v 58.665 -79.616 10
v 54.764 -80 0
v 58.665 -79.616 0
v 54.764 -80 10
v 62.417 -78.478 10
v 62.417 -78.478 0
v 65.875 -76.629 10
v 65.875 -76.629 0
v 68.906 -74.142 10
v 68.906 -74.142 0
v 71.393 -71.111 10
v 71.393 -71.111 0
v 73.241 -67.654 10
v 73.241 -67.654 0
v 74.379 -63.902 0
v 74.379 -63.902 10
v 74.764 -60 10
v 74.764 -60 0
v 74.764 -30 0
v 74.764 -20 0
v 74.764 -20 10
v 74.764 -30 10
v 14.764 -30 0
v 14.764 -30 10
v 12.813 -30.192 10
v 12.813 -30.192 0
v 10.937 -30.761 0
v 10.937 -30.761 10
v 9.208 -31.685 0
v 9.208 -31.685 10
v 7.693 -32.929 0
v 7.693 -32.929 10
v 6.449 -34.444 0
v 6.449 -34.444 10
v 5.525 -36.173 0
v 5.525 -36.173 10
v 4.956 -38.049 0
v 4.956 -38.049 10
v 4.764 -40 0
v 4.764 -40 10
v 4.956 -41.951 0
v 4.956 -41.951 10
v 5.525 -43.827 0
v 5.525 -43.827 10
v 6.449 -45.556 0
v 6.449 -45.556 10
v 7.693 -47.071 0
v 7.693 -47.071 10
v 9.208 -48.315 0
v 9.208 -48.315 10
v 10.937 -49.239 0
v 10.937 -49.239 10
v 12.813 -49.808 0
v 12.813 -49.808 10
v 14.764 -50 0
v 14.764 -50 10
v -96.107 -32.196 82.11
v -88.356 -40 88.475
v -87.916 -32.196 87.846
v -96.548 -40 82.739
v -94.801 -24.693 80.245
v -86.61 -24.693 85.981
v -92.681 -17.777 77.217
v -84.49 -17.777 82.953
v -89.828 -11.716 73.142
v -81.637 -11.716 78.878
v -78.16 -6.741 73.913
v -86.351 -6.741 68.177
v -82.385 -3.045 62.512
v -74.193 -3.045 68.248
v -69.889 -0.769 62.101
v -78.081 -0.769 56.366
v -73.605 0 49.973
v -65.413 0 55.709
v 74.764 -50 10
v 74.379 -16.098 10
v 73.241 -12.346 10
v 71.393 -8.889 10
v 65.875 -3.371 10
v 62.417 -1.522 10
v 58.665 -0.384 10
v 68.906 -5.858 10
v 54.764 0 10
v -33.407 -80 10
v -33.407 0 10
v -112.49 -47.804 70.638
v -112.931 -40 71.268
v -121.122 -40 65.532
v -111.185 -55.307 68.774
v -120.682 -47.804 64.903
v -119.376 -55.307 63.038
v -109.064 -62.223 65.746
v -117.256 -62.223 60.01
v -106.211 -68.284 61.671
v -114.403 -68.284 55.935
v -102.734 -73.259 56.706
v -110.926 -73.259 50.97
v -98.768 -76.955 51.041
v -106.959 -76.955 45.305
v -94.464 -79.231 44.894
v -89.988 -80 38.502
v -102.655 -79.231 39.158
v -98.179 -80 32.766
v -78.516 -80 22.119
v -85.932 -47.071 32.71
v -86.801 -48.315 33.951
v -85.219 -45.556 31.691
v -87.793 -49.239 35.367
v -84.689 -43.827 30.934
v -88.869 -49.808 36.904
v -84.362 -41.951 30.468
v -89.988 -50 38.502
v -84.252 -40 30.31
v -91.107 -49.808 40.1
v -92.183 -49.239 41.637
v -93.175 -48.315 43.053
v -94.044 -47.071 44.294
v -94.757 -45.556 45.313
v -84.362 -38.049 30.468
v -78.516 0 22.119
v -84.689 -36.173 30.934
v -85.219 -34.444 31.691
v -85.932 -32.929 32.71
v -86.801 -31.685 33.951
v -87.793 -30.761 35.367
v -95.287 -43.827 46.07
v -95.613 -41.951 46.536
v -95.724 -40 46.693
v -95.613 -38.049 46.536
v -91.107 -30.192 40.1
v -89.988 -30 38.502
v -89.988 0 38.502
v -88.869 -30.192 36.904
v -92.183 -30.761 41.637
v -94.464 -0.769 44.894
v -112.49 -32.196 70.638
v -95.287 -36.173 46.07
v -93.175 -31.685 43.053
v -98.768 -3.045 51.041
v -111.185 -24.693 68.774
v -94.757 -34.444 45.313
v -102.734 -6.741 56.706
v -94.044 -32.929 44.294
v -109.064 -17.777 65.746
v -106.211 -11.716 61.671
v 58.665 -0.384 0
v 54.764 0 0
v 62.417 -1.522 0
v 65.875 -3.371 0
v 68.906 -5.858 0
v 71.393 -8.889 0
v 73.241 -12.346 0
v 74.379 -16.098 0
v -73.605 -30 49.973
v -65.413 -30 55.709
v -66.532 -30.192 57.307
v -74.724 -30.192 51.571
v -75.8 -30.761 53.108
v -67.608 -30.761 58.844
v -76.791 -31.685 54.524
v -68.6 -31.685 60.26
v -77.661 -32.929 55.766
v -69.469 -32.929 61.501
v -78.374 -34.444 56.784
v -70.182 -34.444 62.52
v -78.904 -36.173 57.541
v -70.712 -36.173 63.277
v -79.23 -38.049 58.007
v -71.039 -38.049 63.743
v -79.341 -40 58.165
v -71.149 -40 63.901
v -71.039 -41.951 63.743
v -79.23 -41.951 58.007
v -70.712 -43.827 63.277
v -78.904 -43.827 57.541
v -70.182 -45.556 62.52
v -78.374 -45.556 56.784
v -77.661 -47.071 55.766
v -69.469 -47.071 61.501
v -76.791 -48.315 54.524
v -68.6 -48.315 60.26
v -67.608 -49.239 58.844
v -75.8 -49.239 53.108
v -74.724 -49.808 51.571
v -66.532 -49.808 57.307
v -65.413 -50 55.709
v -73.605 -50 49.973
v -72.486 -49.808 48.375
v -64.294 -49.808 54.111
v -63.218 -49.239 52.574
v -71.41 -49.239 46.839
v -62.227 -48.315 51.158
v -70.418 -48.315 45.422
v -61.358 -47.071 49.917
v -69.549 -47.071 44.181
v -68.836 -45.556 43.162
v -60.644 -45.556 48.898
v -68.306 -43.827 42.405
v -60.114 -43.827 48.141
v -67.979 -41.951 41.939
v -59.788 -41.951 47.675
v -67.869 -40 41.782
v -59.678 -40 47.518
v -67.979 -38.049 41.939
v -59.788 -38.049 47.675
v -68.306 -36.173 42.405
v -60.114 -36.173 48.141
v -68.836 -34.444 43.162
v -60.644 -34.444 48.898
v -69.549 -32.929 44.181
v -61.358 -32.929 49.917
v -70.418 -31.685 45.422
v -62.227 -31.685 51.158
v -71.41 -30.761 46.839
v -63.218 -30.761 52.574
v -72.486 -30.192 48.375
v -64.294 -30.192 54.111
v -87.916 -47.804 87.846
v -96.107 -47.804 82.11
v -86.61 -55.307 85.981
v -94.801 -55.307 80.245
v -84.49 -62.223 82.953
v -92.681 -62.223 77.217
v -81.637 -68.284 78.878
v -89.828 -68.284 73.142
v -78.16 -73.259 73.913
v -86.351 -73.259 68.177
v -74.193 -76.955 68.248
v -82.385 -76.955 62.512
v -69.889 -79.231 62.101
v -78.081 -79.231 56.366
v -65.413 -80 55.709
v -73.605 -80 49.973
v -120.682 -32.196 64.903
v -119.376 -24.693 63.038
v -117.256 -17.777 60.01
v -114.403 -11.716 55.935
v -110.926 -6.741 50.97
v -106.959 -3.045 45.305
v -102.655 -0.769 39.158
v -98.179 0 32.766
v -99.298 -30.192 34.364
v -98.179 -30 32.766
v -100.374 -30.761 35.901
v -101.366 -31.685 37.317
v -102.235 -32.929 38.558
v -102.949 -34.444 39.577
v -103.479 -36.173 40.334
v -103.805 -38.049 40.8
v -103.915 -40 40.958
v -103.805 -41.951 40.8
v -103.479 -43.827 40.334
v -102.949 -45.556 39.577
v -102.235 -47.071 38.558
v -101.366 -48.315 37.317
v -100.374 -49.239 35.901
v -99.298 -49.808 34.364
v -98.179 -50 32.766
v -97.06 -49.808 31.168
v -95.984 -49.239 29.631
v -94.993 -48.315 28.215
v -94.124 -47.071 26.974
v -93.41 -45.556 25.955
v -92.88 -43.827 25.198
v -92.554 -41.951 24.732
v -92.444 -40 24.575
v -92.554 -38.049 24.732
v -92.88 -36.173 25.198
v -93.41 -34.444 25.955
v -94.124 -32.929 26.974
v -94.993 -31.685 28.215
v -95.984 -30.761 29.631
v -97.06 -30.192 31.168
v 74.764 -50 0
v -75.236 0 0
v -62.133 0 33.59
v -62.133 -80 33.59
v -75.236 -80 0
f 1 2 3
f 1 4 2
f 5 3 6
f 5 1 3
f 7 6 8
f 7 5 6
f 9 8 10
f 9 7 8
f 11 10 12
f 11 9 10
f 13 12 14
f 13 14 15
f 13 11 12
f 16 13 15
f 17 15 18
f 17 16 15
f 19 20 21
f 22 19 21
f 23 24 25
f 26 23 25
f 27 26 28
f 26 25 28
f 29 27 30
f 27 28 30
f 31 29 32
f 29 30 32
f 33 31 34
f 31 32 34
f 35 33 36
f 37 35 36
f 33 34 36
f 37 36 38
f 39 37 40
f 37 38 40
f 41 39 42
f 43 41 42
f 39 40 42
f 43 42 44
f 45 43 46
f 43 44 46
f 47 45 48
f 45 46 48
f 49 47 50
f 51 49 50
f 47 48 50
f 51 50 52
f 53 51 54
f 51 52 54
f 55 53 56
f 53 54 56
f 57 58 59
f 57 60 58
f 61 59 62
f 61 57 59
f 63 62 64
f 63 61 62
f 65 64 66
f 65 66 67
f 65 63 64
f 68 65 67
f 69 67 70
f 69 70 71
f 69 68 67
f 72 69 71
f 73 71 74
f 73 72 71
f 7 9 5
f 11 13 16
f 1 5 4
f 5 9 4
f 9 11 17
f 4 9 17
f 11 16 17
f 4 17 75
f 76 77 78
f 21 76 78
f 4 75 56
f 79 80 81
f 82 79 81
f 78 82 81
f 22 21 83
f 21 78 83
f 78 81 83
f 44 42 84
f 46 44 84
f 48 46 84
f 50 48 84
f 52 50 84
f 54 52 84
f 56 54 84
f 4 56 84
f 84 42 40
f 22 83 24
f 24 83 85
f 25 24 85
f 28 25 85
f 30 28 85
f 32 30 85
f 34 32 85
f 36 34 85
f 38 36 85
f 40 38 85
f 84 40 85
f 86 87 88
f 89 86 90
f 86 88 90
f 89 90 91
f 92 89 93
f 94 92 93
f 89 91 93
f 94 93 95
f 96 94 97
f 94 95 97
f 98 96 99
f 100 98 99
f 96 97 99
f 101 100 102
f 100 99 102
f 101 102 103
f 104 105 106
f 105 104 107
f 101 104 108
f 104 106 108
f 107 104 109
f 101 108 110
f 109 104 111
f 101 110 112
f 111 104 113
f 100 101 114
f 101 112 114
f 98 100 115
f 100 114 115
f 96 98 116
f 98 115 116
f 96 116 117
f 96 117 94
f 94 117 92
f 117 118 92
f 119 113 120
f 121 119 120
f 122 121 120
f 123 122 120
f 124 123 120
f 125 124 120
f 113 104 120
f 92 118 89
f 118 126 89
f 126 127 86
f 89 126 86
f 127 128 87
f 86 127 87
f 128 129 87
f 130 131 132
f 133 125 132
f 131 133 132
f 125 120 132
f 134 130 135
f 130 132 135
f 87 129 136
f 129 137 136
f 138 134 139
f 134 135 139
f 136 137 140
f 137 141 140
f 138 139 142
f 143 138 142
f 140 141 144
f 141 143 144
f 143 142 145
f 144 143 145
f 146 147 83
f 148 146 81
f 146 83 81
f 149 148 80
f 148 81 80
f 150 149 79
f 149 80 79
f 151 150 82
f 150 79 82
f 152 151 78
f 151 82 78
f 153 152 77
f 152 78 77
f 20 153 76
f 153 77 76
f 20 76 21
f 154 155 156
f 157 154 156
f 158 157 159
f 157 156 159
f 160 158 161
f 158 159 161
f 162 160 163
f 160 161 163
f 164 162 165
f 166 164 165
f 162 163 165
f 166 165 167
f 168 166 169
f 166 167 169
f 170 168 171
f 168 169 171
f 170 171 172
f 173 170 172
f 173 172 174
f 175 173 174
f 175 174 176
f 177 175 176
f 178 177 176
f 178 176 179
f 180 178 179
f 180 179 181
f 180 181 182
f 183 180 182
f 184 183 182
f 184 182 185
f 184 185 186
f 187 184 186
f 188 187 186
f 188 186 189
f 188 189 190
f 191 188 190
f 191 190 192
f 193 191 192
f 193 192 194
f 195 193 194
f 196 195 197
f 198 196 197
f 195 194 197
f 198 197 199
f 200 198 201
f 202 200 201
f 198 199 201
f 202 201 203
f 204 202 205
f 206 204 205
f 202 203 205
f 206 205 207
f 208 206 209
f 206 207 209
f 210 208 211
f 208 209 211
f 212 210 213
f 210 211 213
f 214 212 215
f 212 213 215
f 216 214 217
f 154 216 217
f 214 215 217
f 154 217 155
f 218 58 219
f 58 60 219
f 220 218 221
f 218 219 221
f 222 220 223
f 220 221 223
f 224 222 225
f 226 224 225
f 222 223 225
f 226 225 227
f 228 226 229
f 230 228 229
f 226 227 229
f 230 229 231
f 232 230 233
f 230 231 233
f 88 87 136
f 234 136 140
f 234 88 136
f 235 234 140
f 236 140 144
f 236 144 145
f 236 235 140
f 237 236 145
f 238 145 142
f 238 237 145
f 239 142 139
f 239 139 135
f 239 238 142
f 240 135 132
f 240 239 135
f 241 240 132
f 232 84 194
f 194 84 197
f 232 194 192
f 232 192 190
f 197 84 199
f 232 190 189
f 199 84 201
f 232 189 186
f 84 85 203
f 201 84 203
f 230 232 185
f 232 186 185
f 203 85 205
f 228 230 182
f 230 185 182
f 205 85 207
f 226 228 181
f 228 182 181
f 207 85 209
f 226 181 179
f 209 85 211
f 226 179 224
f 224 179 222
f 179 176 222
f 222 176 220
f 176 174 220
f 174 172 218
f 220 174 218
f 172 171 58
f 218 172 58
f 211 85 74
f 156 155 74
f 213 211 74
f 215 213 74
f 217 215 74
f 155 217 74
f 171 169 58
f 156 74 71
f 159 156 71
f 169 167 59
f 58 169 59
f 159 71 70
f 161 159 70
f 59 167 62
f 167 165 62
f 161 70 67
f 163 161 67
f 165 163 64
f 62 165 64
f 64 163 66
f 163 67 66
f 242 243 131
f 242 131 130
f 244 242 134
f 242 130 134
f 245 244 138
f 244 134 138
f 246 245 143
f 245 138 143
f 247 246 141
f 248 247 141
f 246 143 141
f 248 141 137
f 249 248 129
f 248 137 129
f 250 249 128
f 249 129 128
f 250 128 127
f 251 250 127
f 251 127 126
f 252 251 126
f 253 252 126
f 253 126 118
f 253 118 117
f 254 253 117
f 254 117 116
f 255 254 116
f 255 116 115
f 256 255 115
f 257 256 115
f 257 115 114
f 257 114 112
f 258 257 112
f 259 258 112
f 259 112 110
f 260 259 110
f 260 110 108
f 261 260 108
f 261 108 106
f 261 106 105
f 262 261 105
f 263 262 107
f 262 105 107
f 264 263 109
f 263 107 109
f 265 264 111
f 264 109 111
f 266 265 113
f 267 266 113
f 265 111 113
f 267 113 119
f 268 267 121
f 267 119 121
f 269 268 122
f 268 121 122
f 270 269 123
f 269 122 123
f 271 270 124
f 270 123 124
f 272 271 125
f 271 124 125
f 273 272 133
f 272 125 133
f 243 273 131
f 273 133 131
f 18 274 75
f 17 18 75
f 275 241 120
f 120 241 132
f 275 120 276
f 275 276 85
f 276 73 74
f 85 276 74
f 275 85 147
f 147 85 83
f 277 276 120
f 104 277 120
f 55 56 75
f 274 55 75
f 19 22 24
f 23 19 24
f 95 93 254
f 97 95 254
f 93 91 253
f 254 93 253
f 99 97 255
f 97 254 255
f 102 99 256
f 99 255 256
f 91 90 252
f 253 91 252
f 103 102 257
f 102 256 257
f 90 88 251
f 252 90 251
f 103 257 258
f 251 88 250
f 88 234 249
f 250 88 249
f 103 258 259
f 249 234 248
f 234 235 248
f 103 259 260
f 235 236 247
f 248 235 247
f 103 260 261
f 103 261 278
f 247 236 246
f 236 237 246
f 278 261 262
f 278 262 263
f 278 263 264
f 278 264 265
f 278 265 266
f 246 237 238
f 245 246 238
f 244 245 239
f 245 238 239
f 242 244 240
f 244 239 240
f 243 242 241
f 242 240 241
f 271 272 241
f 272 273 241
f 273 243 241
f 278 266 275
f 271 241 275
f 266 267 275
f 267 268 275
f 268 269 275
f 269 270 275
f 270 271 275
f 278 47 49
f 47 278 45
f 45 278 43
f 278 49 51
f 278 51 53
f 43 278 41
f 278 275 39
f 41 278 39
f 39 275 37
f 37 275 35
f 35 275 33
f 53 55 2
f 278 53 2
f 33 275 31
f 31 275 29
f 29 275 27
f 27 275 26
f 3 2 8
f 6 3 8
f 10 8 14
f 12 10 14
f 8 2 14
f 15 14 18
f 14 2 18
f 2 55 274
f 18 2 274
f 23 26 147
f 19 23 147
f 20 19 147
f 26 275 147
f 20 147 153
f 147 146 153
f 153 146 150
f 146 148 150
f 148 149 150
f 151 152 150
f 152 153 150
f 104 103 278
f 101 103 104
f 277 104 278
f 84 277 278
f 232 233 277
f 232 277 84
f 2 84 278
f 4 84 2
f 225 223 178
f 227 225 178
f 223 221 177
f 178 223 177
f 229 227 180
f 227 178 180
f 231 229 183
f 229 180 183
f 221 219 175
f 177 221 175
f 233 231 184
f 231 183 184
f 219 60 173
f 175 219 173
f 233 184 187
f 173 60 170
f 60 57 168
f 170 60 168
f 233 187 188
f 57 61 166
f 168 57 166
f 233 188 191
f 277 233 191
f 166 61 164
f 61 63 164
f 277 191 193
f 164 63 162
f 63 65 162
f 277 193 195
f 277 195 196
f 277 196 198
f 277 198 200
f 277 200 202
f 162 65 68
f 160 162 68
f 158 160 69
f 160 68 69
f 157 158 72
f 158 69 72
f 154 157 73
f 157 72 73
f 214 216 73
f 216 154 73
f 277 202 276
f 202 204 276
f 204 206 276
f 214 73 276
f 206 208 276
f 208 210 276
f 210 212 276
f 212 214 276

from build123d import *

# Parameters (mm, degrees)
F1_DEPTH = 80
F2_R     = 39.99999
F4_DEPTH = 25
F5_R     = 20
F6_R     = 10
F7_DEPTH = 57.1


# Not quite as in the source:
# - a fillet or chamfer is up to 0.001 mm smaller than in the source, because OpenCascade refuses the exact size


with BuildPart() as f1:
    # F0 (on Front) → F1 (new body)
    with BuildSketch(Plane.XZ):
        Polygon((-121.122470571, 65.5321635431), (-75.236355663, 0), (74.763644337, 0), (74.763644337, 10), (-25.236355663, 10), (-33.4074474946, 10), (-88.3563887995, 88.4752209972), (-96.5479092424, 82.7394566337), (-62.1333230613, 33.5903339763), (-78.5163639471, 22.1188052493), (-112.9309501282, 71.2679279066), align=None)
    extrude(amount=F1_DEPTH)

    # F2 (radius 40 in the source; OpenCascade refuses exactly that, so slightly less here)
    f2_edges = [f1.edges().sort_by_distance(p)[0] for p in [
        (-92.452149, -80, 85.607339),
        (-117.02671, -80, 68.400046),
        (-92.452149, 0, 85.607339),
        (-117.02671, 0, 68.400046),
    ]]
    fillet(f2_edges, radius=F2_R)

    # F3 (on face) → F4 (cut)
    with BuildSketch(Plane.XY.offset(10)):
        with BuildLine():
            ThreePointArc((24.763644337, -40), (21.8347121489, -47.0710678119), (14.763644337, -50))
            Line((14.763644337, -50), (134.763644337, -50))
            Line((134.763644337, -50), (134.763644337, -30))
            Line((134.763644337, -30), (14.763644337, -30))
            ThreePointArc((14.763644337, -30), (21.8347121489, -32.9289321881), (24.763644337, -40))
        make_face()
        with BuildLine():
            ThreePointArc((14.763644337, -30), (4.763644337, -40), (14.763644337, -50))
            Line((14.763644337, -50), (14.763644337, -30))
        make_face()
        with BuildLine():
            Line((14.763644337, -30), (14.763644337, -50))
            ThreePointArc((14.763644337, -50), (21.8347121489, -47.0710678119), (24.763644337, -40))
            ThreePointArc((24.763644337, -40), (21.8347121489, -32.9289321881), (14.763644337, -30))
        make_face()
    extrude(amount=-F4_DEPTH, mode=Mode.SUBTRACT)

    # F5
    f5_edges = [f1.edges().sort_by_distance(p)[0] for p in [
        (74.763644, 0, 5),
        (74.763644, -80, 5),
    ]]
    fillet(f5_edges, radius=F5_R)

    # F6 (on face) → F7 (cut)
    with BuildSketch(Plane(origin=(-17.7182706335, 0, -12.4064666616), x_dir=(0, 1, 0), z_dir=(0.8191520443, 0, 0.5735764364))):
        with Locations((-40, 83.1538007652)):
            Circle(F6_R)
    extrude(amount=-F7_DEPTH, mode=Mode.SUBTRACT)


solid = f1.part
